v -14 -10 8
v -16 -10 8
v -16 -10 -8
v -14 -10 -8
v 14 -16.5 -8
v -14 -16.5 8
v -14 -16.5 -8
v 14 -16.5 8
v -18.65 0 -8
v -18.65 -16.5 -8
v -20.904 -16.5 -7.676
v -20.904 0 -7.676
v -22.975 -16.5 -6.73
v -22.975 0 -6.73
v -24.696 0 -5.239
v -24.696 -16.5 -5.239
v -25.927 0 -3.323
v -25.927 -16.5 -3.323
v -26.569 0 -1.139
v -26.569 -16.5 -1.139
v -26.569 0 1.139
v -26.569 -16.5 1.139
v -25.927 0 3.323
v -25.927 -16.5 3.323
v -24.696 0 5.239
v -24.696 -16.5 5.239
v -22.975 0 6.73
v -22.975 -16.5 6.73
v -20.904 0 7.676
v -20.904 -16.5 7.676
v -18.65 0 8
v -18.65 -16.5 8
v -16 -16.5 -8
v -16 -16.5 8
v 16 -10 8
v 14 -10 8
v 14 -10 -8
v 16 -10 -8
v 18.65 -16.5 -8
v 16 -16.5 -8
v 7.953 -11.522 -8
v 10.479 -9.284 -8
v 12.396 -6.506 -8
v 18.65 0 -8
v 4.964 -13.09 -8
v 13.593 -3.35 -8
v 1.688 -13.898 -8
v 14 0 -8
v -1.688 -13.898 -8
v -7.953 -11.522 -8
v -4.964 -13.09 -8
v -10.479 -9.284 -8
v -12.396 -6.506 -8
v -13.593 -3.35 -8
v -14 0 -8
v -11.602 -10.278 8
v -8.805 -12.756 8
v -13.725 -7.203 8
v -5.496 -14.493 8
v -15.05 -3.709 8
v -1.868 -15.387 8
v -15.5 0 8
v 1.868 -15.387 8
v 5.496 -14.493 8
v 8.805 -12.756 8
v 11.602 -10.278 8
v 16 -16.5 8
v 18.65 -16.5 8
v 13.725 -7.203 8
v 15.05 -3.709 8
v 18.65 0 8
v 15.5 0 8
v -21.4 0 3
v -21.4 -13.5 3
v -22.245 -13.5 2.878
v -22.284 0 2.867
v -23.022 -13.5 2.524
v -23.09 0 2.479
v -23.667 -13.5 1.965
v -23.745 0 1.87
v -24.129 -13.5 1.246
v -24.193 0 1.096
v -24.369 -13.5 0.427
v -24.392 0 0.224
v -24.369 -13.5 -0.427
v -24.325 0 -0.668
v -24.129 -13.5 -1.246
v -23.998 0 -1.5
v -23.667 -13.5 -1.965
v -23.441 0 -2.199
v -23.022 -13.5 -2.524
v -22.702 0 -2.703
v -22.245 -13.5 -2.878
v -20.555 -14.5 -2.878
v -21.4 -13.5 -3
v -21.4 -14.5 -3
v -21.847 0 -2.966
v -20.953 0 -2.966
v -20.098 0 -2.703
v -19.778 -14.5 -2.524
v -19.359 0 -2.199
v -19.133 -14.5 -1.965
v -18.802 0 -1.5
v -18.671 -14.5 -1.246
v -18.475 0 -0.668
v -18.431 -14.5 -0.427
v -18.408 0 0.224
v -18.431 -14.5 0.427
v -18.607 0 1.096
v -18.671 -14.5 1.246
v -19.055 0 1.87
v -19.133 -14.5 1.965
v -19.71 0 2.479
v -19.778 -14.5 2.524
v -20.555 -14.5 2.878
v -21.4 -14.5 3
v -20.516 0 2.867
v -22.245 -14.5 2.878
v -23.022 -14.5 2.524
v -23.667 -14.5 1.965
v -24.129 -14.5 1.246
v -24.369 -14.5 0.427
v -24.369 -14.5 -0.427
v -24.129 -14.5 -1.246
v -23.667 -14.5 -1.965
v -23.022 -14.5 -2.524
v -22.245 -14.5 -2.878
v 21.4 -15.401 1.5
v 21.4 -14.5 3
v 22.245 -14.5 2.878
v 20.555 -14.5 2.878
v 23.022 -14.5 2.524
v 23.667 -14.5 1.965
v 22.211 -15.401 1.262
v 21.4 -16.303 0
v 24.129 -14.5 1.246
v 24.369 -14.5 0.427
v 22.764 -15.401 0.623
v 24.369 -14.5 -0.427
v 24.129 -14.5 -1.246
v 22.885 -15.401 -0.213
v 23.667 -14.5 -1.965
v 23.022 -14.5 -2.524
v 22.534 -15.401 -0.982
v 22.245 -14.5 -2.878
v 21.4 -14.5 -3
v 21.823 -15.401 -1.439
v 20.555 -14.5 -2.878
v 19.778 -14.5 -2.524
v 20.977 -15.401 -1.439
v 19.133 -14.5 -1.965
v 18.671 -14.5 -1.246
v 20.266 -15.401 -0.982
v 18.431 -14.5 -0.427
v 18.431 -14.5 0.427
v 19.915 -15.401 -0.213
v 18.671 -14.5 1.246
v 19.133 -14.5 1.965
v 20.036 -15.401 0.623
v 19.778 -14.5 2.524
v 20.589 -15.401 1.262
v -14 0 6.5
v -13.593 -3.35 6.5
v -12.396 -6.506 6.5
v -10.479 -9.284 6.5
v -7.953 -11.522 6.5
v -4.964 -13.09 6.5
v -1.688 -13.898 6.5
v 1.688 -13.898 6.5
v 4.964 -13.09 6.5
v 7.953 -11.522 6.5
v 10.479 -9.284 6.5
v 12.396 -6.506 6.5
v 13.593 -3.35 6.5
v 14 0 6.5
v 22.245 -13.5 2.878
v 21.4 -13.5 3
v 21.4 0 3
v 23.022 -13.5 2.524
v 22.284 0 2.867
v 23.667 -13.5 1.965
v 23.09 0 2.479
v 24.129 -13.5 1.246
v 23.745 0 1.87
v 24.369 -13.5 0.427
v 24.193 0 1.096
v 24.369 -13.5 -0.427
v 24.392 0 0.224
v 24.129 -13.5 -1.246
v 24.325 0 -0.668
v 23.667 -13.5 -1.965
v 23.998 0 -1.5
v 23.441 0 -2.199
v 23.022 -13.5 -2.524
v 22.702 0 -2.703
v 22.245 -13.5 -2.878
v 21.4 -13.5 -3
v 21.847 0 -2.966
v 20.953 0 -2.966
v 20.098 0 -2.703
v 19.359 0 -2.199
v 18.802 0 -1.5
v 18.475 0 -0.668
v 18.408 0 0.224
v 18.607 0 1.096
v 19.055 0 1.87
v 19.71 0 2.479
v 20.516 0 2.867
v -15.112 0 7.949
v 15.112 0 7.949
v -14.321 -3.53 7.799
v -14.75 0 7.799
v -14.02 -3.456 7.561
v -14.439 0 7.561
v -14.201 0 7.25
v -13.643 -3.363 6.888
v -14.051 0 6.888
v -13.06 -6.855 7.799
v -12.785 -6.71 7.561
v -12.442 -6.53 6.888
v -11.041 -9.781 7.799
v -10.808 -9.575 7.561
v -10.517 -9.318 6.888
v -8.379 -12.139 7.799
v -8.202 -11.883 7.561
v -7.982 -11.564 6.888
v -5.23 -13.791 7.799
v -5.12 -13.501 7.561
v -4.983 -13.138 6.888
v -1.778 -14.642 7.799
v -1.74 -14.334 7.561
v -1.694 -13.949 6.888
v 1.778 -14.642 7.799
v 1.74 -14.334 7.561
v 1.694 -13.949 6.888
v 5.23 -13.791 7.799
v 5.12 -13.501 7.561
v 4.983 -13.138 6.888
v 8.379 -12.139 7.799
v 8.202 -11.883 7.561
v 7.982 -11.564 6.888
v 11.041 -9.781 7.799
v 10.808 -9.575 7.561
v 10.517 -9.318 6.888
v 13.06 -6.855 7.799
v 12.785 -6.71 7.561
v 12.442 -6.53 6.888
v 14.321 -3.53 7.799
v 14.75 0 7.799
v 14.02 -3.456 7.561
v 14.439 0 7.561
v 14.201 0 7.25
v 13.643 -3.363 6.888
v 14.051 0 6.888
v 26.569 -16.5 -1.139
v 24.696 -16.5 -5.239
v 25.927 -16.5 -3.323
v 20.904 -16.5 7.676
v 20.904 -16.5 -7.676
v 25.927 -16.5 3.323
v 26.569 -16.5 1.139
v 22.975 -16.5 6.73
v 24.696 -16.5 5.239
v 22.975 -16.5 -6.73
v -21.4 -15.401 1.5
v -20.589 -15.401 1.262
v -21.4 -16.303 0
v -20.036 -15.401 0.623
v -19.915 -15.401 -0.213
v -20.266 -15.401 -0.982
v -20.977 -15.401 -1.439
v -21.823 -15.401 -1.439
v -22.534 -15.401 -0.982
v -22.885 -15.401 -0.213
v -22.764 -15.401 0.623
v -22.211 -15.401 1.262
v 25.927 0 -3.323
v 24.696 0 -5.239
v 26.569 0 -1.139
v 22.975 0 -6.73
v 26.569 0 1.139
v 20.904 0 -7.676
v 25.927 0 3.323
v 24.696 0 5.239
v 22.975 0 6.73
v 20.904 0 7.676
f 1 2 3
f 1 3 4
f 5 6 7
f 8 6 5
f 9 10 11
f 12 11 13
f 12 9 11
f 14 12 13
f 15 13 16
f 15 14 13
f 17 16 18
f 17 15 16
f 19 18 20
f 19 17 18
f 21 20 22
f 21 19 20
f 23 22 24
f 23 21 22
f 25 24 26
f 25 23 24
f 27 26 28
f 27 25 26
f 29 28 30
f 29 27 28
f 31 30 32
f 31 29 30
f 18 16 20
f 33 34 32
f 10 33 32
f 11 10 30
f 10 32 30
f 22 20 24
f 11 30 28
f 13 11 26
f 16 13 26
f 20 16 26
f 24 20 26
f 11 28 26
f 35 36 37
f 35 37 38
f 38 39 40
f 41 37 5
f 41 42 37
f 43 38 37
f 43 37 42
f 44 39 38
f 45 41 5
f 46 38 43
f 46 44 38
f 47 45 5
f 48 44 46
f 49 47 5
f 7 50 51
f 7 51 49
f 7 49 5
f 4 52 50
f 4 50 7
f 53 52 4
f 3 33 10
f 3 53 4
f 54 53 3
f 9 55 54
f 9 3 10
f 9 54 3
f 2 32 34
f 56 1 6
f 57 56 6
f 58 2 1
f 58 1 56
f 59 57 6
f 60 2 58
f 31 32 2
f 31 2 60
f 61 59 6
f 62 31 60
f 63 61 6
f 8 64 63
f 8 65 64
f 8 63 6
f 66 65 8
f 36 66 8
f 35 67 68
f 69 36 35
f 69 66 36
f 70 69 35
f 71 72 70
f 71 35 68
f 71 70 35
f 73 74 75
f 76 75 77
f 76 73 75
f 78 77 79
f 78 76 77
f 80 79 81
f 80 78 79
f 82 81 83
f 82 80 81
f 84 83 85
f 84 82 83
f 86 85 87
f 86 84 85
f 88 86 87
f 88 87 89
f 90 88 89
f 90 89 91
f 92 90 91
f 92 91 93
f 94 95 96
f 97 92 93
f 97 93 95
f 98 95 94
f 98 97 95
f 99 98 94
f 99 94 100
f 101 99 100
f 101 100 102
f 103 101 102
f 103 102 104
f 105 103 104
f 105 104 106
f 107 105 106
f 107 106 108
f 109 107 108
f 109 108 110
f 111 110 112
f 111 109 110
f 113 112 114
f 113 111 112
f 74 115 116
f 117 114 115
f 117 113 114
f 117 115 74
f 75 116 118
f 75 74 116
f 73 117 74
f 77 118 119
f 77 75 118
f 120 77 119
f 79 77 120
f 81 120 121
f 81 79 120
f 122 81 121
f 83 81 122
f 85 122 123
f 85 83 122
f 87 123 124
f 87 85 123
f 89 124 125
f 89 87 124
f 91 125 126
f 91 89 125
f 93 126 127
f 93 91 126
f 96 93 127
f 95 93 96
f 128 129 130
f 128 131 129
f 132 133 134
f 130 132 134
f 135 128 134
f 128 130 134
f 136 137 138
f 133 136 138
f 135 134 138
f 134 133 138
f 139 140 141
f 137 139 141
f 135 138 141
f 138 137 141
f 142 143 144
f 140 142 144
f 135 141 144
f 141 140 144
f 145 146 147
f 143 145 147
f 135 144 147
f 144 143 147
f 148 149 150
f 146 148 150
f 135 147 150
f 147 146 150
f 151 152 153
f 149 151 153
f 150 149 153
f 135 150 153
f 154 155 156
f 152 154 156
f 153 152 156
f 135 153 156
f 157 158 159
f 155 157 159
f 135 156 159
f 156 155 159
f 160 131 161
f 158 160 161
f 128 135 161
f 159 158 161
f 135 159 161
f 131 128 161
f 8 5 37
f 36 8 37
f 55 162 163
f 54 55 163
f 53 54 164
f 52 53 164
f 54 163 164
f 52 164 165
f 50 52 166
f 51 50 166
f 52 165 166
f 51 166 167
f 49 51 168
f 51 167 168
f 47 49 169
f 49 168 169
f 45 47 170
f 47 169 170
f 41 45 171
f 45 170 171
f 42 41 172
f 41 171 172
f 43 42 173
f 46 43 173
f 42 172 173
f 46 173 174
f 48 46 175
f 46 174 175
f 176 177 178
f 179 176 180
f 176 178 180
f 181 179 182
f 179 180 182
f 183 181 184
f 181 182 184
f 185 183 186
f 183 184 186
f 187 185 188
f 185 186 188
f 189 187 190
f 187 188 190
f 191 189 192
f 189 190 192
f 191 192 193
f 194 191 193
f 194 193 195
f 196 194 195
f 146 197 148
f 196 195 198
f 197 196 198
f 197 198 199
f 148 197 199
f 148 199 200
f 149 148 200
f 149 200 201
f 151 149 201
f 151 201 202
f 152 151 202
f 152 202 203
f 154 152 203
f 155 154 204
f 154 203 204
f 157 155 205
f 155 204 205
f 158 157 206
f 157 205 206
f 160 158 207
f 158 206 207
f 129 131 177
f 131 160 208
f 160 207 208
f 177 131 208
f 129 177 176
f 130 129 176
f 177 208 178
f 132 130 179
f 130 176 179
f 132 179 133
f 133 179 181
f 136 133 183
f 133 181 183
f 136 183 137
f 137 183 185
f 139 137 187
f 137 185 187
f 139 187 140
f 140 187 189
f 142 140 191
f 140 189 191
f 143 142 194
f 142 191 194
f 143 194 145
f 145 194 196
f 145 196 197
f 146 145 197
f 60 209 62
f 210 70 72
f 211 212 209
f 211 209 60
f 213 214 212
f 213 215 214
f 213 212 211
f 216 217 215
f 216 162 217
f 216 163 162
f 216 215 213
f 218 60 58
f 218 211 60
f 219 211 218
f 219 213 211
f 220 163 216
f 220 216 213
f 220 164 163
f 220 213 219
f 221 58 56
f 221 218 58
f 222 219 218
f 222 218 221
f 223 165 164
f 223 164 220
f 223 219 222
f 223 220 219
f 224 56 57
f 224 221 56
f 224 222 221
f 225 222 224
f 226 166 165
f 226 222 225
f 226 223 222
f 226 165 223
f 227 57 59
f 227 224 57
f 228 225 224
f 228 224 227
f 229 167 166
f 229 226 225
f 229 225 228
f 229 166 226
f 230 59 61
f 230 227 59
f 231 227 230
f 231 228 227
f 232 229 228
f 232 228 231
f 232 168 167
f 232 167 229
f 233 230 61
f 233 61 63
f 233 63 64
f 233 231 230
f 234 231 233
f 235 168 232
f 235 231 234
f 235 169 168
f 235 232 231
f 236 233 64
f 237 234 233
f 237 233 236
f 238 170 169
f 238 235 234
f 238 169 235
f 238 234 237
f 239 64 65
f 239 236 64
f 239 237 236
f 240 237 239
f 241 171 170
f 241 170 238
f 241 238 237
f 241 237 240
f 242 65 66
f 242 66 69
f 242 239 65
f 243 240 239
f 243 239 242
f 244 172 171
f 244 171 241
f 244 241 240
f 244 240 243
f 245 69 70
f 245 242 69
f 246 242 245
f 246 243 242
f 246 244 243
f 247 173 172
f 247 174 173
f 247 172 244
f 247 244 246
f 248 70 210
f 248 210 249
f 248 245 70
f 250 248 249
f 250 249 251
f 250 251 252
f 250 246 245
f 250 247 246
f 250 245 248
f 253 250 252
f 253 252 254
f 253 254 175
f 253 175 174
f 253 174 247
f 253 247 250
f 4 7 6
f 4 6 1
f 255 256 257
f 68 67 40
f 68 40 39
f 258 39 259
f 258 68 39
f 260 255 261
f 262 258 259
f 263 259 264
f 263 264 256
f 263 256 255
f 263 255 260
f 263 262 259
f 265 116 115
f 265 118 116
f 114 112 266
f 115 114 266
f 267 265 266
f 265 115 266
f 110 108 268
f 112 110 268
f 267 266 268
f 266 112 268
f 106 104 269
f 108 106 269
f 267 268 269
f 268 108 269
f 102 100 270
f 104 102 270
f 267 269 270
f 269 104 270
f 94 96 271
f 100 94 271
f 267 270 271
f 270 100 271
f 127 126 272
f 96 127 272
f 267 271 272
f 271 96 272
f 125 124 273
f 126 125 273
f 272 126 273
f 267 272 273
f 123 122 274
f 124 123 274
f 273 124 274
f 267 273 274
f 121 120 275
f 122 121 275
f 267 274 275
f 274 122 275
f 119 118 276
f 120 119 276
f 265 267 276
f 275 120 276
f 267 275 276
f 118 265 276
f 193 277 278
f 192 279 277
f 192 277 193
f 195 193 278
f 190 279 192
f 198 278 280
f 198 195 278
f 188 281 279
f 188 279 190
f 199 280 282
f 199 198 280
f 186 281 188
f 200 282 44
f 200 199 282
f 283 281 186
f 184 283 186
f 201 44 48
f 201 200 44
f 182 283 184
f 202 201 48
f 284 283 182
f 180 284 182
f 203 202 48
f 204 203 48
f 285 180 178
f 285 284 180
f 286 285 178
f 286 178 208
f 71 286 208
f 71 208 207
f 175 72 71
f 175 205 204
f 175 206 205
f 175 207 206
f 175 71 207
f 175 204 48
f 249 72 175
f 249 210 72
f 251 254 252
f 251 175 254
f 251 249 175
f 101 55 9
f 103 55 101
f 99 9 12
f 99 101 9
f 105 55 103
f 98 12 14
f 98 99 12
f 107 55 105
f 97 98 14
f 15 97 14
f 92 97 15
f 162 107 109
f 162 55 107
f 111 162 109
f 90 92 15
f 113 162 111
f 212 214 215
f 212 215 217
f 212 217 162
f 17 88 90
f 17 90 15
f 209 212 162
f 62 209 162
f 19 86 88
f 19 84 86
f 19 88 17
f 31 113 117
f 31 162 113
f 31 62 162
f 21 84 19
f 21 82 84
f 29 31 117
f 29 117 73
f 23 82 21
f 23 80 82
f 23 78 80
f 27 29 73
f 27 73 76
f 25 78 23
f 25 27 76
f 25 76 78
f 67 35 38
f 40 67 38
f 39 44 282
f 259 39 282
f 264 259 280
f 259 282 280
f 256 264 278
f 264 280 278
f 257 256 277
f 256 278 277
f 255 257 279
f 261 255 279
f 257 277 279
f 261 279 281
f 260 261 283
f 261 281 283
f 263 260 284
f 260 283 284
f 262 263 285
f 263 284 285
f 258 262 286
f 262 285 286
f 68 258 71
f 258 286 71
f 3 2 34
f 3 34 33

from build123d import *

# Parameters (mm, degrees)
DODANIE_WYCI_GNI_CIE1_DEPTH     = 8
SZKIC4_R                        = 3
WYTNIJ_WYCI_GNI_CIE1_DEPTH      = 51.635955605
ZAOKR_GLENIE1_R                 = 1.5
WYTNIJ_WYCI_GNI_CIE4_START      = -16
WYTNIJ_WYCI_GNI_CIE4_DEPTH      = 16
WYTNIJ_WYCI_GNI_CIE8_DEPTH      = 36.191937997
WYTNIJ_WYCI_GNI_CIE8_DEPTH_BACK = 36.191937997
SZKIC15_W                       = 2
SZKIC15_H                       = 6.5
SZKIC16_R                       = 3
DODANIE_WYCI_GNI_CIE2_DEPTH     = 11.5
DODANIE_WYCI_GNI_CIE3_START     = -3
SZKIC17_R                       = 3
DODANIE_WYCI_GNI_CIE3_DEPTH     = 3
OTWORY_USTALAJ_CE_6_0MM1_D      = 6
OTWORY_USTALAJ_CE_6_0MM1_DEPTH  = 1
OTWORY_USTALAJ_CE_6_0MM1_TIP    = 1.802581857


# Read off the part's stored shape, not the designer's step: Wytnij-wyciągnięcie4
with BuildPart() as part:
    # Szkic1 → Dodanie-wyciągnięcie1 (new, symmetric)
    with BuildSketch(Plane.XY):
        with BuildLine():
            ThreePointArc((-16, 0), (0, -16), (16, 0))
            Line((16, 0), (30, 0))
            Line((30, 0), (30, -40))
            Line((30, -40), (-30, -40))
            Line((-30, -40), (-30, 0))
            Line((-30, 0), (-16, 0))
        make_face()
        with BuildLine():
            ThreePointArc((-14, 0), (0, -14), (14, 0))
            Line((14, 0), (16, 0))
            ThreePointArc((16, 0), (0, -16), (-16, 0))
            Line((-16, 0), (-14, 0))
        make_face()
    extrude(amount=DODANIE_WYCI_GNI_CIE1_DEPTH, both=True)

    # Szkic4 → Wytnij-wyciągnięcie1 (cut, through all)
    with BuildSketch(Plane(origin=(0, 0, 0), x_dir=(1, 0, 0), z_dir=(0, 1, 0))):
        with BuildLine():
            ThreePointArc((-18.65, -8), (-26.65, 0), (-18.65, 8))
            Line((-18.65, 8), (-30, 8))
            Line((-30, 8), (-30, -8))
            Line((-30, -8), (-18.65, -8))
        make_face()
        with BuildLine():
            Line((30, 8), (18.65, 8))
            ThreePointArc((18.65, 8), (26.65, 0), (18.65, -8))
            Line((18.65, -8), (30, -8))
            Line((30, -8), (30, 8))
        make_face()
        with Locations(Location((21.4, 0, 0), (0, 0, 270))):
            Circle(SZKIC4_R)
        with Locations(Location((-21.4, 0, 0), (0, 0, 270))):
            Circle(SZKIC4_R)
    extrude(amount=-WYTNIJ_WYCI_GNI_CIE1_DEPTH, mode=Mode.SUBTRACT)

    # Zaokrąglenie1
    zaokr_glenie1_edges = [part.edges().sort_by_distance(p)[0] for p in [
        (0, -14, 8),
    ]]
    fillet(zaokr_glenie1_edges, radius=ZAOKR_GLENIE1_R)

    # Wytnij-wyciągnięcie4 outline → Wytnij-wyciągnięcie4 (cut)
    with BuildSketch(Plane(origin=(0, 0, -8), x_dir=(-1, 0, 0), z_dir=(0, 0, -1)).offset(WYTNIJ_WYCI_GNI_CIE4_START)):
        Polygon((-16, -16.5), (-16, -5), (-37.876810691, -5), (-37.876810691, -40), (49.702662137, -40), (49.702662137, -5), (16, -5), (16, -16.5), align=None)
    extrude(amount=WYTNIJ_WYCI_GNI_CIE4_DEPTH, mode=Mode.SUBTRACT)

    # Szkic15 → Wytnij-wyciągnięcie8 (cut, two sides: drawn at the far end of the back side and taken through both)
    with BuildSketch(Plane.XY.offset(8).offset(-WYTNIJ_WYCI_GNI_CIE8_DEPTH_BACK)):
        with Locations((15, -13.25)):
            Rectangle(SZKIC15_W, SZKIC15_H)
        with Locations((-15, -13.25)):
            Rectangle(SZKIC15_W, SZKIC15_H)
    extrude(amount=WYTNIJ_WYCI_GNI_CIE8_DEPTH + WYTNIJ_WYCI_GNI_CIE8_DEPTH_BACK, mode=Mode.SUBTRACT)

    # Szkic16 → Dodanie-wyciągnięcie2 (add)
    # profile 1 of 2: a face of its own
    with BuildSketch(Plane.XZ.offset(5)):
        with BuildLine():
            Line((-16, 8), (-16, -8))
            Line((-16, -8), (-18.65, -8))
            ThreePointArc((-18.65, -8), (-26.65, 0), (-18.65, 8))
            Line((-18.65, 8), (-16, 8))
        make_face()
        with Locations(Location((-21.4, 0, 0), (0, 0, 90))):
            Circle(SZKIC16_R, mode=Mode.SUBTRACT)
    # profile 2 of 2: a face of its own
    with BuildSketch(Plane.XZ.offset(5)):
        with BuildLine():
            Line((16, 8), (16, -8))
            Line((16, -8), (18.65, -8))
            ThreePointArc((18.65, -8), (26.65, 0), (18.65, 8))
            Line((18.65, 8), (16, 8))
        make_face()
        with Locations(Location((21.4, 0, 0), (0, 0, 90))):
            Circle(SZKIC16_R, mode=Mode.SUBTRACT)
    extrude(amount=DODANIE_WYCI_GNI_CIE2_DEPTH)

    # Szkic17 → Dodanie-wyciągnięcie3 (add)
    with BuildSketch(Plane.XZ.offset(16.5).offset(DODANIE_WYCI_GNI_CIE3_START)):
        with Locations(Location((-21.4, 0, 0), (0, 0, 90))):
            Circle(SZKIC17_R)
        with Locations(Location((21.4, 0, 0), (0, 0, 90))):
            Circle(SZKIC17_R)
    extrude(amount=DODANIE_WYCI_GNI_CIE3_DEPTH)

    # Otwory ustalające Ø6.0mm1
    with Locations(Plane(origin=(-21.4, -13.5, 0), x_dir=(0, 0, 1), z_dir=(0, 1, 0))):
        with Locations((0, 0), (0, 42.8)):
            Hole(OTWORY_USTALAJ_CE_6_0MM1_D / 2, depth=OTWORY_USTALAJ_CE_6_0MM1_DEPTH)
            with Locations((0, 0, -(OTWORY_USTALAJ_CE_6_0MM1_DEPTH + OTWORY_USTALAJ_CE_6_0MM1_TIP / 2))):  # 118° drill point
                Cone(0, OTWORY_USTALAJ_CE_6_0MM1_D / 2, OTWORY_USTALAJ_CE_6_0MM1_TIP, mode=Mode.SUBTRACT)


solid = part.part
